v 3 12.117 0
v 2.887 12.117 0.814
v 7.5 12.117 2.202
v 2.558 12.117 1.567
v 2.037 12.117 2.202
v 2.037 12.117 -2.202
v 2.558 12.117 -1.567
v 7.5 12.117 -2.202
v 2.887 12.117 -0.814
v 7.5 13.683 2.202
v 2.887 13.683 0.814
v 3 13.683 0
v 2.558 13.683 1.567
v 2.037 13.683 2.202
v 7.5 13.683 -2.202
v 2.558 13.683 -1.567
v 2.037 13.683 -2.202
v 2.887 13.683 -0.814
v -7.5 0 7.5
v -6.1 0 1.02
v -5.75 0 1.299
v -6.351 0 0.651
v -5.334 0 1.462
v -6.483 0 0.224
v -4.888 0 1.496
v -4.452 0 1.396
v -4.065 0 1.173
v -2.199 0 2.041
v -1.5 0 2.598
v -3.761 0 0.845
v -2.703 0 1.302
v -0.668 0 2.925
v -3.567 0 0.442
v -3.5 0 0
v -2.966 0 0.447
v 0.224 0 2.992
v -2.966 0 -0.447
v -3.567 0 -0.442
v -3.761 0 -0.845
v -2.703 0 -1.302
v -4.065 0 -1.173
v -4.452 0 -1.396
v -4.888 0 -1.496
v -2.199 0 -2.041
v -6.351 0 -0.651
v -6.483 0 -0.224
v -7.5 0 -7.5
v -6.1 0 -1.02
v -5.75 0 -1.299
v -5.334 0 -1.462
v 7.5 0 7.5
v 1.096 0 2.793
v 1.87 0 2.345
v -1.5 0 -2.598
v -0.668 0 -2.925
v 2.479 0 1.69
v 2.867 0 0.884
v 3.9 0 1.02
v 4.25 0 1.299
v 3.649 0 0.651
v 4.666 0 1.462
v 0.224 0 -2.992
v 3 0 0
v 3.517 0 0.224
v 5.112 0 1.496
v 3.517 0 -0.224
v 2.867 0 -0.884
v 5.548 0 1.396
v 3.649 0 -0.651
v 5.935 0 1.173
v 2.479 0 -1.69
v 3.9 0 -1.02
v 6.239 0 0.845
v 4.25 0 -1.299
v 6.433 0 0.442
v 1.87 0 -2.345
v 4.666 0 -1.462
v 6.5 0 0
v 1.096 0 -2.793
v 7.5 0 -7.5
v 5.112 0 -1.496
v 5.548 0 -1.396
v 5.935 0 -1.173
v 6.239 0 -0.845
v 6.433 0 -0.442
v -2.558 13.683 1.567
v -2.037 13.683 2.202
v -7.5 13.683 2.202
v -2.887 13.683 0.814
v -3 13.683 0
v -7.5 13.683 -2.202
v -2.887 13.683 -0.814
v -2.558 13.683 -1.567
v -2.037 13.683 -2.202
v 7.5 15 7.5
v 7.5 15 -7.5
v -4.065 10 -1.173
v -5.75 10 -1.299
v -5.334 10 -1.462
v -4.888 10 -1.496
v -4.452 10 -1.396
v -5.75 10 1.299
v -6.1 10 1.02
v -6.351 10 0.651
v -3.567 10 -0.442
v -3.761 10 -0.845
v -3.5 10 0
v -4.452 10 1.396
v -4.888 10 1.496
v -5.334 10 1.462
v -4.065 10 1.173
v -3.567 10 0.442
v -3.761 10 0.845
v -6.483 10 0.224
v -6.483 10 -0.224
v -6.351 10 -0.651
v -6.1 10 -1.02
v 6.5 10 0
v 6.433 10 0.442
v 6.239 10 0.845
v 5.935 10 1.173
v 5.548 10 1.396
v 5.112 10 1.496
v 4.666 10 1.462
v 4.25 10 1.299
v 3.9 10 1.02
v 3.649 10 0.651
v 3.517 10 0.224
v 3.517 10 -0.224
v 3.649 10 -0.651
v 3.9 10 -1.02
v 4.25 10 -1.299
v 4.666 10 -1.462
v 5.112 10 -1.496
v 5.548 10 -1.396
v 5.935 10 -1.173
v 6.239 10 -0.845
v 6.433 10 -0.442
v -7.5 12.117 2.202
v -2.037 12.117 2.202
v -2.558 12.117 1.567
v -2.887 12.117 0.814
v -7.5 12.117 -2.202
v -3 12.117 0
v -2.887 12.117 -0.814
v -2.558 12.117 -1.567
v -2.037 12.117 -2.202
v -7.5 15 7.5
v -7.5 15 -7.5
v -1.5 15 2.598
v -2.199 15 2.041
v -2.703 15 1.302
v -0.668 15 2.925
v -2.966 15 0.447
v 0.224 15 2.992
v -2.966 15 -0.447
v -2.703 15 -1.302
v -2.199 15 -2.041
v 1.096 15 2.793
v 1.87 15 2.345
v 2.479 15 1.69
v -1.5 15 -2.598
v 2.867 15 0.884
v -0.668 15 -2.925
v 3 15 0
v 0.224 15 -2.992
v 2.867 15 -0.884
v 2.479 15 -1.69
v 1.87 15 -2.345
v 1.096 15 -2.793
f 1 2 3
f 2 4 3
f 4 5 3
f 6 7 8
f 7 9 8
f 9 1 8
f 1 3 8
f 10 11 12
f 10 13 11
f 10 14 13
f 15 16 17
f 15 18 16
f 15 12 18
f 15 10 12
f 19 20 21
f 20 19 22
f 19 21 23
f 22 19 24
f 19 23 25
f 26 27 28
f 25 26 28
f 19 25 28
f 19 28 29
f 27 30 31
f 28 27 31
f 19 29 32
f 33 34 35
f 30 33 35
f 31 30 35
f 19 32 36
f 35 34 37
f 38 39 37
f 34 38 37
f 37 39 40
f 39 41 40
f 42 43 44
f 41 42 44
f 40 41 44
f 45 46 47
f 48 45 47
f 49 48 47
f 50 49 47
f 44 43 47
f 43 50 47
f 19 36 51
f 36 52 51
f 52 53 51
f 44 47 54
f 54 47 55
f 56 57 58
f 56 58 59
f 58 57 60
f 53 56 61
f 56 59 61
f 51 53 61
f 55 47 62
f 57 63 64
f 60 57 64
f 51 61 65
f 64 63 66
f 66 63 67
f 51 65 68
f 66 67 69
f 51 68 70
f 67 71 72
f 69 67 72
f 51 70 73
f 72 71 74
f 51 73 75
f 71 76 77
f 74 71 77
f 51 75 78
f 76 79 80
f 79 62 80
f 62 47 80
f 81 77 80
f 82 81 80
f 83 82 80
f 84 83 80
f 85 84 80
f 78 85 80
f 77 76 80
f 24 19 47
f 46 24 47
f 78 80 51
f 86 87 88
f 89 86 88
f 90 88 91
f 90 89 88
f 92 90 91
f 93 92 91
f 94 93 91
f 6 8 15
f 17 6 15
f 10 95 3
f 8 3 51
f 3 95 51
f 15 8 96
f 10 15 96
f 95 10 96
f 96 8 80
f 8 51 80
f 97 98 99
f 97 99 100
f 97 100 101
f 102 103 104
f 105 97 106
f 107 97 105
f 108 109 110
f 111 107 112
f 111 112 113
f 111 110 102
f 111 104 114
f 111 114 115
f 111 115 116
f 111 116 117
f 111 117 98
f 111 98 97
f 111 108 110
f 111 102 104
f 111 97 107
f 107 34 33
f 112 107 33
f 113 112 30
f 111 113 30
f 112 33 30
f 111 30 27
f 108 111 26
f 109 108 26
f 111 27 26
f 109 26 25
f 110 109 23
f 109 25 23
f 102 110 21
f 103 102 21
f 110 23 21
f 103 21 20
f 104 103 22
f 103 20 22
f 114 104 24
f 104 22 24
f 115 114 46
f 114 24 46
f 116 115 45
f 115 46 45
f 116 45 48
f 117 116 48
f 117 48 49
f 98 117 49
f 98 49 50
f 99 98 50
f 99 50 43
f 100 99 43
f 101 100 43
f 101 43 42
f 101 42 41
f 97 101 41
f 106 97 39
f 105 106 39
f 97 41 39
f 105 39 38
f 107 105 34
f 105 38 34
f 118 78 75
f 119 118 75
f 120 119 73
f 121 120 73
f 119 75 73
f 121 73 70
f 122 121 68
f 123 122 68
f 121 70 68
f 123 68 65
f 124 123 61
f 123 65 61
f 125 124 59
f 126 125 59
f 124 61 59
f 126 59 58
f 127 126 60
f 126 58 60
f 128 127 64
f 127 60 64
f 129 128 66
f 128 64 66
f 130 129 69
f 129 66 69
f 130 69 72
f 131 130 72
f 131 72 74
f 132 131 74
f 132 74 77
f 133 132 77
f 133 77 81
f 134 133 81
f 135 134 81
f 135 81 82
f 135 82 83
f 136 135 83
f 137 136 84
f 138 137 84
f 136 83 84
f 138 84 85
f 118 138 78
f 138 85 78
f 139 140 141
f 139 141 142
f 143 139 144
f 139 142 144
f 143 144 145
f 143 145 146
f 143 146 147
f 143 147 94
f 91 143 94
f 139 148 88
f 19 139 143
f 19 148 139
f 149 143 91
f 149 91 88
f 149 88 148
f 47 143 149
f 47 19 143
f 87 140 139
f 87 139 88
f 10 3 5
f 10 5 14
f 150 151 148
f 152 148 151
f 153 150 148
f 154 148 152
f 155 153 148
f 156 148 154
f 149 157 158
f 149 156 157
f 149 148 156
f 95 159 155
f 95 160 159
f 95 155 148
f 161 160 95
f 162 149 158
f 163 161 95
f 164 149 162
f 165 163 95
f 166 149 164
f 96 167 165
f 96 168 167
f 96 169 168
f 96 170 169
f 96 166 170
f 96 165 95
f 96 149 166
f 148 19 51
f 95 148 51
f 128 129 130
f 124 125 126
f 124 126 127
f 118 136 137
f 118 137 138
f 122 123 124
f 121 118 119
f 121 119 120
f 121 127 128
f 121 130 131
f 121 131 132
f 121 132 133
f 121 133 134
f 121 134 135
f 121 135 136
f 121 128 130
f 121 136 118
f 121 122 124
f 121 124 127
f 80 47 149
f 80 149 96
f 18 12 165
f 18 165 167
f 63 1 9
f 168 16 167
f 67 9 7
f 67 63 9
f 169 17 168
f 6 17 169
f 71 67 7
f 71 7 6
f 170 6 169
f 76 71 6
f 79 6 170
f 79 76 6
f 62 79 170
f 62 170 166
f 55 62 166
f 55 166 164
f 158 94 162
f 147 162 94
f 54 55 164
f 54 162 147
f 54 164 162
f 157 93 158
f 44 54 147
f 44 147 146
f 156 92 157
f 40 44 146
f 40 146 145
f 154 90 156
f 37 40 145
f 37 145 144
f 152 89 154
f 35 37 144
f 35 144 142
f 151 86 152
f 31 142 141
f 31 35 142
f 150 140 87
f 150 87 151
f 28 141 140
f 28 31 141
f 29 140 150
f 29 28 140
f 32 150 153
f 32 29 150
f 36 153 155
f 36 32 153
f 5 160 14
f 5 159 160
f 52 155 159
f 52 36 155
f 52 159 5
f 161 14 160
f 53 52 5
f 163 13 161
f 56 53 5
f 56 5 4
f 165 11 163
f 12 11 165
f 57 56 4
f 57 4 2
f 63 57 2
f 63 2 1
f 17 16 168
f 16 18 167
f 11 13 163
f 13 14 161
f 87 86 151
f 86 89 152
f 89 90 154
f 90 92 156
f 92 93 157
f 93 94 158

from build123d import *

# Parameters (mm, degrees)
ESQUISSE1_W             = 15
ESQUISSE1_H             = 15
ESQUISSE1_R             = 3
BOSS_EXTRU_1_DEPTH      = 15
ESQUISSE2_W             = 4.404326356
ESQUISSE2_H             = 1.565605919
ENL_V_MAT_EXTRU_1_DEPTH = 15
ESQUISSE3_R             = 1.5
ENL_V_MAT_EXTRU_2_DEPTH = 10


with BuildPart() as part:
    # Esquisse1 → Boss.-Extru.1 (new body)
    with BuildSketch(Plane(origin=(0, 0, 0), x_dir=(1, 0, 0), z_dir=(0, 1, 0))):
        Rectangle(ESQUISSE1_W, ESQUISSE1_H)
        Circle(ESQUISSE1_R, mode=Mode.SUBTRACT)
    extrude(amount=BOSS_EXTRU_1_DEPTH)

    # Esquisse2 → Enlèv. mat.-Extru.1 (cut)
    with BuildSketch(Plane(origin=(7.5, 0, 0), x_dir=(0, 0, -1), z_dir=(1, 0, 0))):
        with Locations((0, 12.899904082)):
            Rectangle(ESQUISSE2_W, ESQUISSE2_H)
    extrude(amount=-ENL_V_MAT_EXTRU_1_DEPTH, mode=Mode.SUBTRACT)

    # Esquisse3 → Enlèv. mat.-Extru.2 (cut)
    with BuildSketch(Plane.XZ):
        with Locations((5, 0)):
            Circle(ESQUISSE3_R)
        with Locations((-5, 0)):
            Circle(ESQUISSE3_R)
    extrude(amount=-ENL_V_MAT_EXTRU_2_DEPTH, mode=Mode.SUBTRACT)


solid = part.part
